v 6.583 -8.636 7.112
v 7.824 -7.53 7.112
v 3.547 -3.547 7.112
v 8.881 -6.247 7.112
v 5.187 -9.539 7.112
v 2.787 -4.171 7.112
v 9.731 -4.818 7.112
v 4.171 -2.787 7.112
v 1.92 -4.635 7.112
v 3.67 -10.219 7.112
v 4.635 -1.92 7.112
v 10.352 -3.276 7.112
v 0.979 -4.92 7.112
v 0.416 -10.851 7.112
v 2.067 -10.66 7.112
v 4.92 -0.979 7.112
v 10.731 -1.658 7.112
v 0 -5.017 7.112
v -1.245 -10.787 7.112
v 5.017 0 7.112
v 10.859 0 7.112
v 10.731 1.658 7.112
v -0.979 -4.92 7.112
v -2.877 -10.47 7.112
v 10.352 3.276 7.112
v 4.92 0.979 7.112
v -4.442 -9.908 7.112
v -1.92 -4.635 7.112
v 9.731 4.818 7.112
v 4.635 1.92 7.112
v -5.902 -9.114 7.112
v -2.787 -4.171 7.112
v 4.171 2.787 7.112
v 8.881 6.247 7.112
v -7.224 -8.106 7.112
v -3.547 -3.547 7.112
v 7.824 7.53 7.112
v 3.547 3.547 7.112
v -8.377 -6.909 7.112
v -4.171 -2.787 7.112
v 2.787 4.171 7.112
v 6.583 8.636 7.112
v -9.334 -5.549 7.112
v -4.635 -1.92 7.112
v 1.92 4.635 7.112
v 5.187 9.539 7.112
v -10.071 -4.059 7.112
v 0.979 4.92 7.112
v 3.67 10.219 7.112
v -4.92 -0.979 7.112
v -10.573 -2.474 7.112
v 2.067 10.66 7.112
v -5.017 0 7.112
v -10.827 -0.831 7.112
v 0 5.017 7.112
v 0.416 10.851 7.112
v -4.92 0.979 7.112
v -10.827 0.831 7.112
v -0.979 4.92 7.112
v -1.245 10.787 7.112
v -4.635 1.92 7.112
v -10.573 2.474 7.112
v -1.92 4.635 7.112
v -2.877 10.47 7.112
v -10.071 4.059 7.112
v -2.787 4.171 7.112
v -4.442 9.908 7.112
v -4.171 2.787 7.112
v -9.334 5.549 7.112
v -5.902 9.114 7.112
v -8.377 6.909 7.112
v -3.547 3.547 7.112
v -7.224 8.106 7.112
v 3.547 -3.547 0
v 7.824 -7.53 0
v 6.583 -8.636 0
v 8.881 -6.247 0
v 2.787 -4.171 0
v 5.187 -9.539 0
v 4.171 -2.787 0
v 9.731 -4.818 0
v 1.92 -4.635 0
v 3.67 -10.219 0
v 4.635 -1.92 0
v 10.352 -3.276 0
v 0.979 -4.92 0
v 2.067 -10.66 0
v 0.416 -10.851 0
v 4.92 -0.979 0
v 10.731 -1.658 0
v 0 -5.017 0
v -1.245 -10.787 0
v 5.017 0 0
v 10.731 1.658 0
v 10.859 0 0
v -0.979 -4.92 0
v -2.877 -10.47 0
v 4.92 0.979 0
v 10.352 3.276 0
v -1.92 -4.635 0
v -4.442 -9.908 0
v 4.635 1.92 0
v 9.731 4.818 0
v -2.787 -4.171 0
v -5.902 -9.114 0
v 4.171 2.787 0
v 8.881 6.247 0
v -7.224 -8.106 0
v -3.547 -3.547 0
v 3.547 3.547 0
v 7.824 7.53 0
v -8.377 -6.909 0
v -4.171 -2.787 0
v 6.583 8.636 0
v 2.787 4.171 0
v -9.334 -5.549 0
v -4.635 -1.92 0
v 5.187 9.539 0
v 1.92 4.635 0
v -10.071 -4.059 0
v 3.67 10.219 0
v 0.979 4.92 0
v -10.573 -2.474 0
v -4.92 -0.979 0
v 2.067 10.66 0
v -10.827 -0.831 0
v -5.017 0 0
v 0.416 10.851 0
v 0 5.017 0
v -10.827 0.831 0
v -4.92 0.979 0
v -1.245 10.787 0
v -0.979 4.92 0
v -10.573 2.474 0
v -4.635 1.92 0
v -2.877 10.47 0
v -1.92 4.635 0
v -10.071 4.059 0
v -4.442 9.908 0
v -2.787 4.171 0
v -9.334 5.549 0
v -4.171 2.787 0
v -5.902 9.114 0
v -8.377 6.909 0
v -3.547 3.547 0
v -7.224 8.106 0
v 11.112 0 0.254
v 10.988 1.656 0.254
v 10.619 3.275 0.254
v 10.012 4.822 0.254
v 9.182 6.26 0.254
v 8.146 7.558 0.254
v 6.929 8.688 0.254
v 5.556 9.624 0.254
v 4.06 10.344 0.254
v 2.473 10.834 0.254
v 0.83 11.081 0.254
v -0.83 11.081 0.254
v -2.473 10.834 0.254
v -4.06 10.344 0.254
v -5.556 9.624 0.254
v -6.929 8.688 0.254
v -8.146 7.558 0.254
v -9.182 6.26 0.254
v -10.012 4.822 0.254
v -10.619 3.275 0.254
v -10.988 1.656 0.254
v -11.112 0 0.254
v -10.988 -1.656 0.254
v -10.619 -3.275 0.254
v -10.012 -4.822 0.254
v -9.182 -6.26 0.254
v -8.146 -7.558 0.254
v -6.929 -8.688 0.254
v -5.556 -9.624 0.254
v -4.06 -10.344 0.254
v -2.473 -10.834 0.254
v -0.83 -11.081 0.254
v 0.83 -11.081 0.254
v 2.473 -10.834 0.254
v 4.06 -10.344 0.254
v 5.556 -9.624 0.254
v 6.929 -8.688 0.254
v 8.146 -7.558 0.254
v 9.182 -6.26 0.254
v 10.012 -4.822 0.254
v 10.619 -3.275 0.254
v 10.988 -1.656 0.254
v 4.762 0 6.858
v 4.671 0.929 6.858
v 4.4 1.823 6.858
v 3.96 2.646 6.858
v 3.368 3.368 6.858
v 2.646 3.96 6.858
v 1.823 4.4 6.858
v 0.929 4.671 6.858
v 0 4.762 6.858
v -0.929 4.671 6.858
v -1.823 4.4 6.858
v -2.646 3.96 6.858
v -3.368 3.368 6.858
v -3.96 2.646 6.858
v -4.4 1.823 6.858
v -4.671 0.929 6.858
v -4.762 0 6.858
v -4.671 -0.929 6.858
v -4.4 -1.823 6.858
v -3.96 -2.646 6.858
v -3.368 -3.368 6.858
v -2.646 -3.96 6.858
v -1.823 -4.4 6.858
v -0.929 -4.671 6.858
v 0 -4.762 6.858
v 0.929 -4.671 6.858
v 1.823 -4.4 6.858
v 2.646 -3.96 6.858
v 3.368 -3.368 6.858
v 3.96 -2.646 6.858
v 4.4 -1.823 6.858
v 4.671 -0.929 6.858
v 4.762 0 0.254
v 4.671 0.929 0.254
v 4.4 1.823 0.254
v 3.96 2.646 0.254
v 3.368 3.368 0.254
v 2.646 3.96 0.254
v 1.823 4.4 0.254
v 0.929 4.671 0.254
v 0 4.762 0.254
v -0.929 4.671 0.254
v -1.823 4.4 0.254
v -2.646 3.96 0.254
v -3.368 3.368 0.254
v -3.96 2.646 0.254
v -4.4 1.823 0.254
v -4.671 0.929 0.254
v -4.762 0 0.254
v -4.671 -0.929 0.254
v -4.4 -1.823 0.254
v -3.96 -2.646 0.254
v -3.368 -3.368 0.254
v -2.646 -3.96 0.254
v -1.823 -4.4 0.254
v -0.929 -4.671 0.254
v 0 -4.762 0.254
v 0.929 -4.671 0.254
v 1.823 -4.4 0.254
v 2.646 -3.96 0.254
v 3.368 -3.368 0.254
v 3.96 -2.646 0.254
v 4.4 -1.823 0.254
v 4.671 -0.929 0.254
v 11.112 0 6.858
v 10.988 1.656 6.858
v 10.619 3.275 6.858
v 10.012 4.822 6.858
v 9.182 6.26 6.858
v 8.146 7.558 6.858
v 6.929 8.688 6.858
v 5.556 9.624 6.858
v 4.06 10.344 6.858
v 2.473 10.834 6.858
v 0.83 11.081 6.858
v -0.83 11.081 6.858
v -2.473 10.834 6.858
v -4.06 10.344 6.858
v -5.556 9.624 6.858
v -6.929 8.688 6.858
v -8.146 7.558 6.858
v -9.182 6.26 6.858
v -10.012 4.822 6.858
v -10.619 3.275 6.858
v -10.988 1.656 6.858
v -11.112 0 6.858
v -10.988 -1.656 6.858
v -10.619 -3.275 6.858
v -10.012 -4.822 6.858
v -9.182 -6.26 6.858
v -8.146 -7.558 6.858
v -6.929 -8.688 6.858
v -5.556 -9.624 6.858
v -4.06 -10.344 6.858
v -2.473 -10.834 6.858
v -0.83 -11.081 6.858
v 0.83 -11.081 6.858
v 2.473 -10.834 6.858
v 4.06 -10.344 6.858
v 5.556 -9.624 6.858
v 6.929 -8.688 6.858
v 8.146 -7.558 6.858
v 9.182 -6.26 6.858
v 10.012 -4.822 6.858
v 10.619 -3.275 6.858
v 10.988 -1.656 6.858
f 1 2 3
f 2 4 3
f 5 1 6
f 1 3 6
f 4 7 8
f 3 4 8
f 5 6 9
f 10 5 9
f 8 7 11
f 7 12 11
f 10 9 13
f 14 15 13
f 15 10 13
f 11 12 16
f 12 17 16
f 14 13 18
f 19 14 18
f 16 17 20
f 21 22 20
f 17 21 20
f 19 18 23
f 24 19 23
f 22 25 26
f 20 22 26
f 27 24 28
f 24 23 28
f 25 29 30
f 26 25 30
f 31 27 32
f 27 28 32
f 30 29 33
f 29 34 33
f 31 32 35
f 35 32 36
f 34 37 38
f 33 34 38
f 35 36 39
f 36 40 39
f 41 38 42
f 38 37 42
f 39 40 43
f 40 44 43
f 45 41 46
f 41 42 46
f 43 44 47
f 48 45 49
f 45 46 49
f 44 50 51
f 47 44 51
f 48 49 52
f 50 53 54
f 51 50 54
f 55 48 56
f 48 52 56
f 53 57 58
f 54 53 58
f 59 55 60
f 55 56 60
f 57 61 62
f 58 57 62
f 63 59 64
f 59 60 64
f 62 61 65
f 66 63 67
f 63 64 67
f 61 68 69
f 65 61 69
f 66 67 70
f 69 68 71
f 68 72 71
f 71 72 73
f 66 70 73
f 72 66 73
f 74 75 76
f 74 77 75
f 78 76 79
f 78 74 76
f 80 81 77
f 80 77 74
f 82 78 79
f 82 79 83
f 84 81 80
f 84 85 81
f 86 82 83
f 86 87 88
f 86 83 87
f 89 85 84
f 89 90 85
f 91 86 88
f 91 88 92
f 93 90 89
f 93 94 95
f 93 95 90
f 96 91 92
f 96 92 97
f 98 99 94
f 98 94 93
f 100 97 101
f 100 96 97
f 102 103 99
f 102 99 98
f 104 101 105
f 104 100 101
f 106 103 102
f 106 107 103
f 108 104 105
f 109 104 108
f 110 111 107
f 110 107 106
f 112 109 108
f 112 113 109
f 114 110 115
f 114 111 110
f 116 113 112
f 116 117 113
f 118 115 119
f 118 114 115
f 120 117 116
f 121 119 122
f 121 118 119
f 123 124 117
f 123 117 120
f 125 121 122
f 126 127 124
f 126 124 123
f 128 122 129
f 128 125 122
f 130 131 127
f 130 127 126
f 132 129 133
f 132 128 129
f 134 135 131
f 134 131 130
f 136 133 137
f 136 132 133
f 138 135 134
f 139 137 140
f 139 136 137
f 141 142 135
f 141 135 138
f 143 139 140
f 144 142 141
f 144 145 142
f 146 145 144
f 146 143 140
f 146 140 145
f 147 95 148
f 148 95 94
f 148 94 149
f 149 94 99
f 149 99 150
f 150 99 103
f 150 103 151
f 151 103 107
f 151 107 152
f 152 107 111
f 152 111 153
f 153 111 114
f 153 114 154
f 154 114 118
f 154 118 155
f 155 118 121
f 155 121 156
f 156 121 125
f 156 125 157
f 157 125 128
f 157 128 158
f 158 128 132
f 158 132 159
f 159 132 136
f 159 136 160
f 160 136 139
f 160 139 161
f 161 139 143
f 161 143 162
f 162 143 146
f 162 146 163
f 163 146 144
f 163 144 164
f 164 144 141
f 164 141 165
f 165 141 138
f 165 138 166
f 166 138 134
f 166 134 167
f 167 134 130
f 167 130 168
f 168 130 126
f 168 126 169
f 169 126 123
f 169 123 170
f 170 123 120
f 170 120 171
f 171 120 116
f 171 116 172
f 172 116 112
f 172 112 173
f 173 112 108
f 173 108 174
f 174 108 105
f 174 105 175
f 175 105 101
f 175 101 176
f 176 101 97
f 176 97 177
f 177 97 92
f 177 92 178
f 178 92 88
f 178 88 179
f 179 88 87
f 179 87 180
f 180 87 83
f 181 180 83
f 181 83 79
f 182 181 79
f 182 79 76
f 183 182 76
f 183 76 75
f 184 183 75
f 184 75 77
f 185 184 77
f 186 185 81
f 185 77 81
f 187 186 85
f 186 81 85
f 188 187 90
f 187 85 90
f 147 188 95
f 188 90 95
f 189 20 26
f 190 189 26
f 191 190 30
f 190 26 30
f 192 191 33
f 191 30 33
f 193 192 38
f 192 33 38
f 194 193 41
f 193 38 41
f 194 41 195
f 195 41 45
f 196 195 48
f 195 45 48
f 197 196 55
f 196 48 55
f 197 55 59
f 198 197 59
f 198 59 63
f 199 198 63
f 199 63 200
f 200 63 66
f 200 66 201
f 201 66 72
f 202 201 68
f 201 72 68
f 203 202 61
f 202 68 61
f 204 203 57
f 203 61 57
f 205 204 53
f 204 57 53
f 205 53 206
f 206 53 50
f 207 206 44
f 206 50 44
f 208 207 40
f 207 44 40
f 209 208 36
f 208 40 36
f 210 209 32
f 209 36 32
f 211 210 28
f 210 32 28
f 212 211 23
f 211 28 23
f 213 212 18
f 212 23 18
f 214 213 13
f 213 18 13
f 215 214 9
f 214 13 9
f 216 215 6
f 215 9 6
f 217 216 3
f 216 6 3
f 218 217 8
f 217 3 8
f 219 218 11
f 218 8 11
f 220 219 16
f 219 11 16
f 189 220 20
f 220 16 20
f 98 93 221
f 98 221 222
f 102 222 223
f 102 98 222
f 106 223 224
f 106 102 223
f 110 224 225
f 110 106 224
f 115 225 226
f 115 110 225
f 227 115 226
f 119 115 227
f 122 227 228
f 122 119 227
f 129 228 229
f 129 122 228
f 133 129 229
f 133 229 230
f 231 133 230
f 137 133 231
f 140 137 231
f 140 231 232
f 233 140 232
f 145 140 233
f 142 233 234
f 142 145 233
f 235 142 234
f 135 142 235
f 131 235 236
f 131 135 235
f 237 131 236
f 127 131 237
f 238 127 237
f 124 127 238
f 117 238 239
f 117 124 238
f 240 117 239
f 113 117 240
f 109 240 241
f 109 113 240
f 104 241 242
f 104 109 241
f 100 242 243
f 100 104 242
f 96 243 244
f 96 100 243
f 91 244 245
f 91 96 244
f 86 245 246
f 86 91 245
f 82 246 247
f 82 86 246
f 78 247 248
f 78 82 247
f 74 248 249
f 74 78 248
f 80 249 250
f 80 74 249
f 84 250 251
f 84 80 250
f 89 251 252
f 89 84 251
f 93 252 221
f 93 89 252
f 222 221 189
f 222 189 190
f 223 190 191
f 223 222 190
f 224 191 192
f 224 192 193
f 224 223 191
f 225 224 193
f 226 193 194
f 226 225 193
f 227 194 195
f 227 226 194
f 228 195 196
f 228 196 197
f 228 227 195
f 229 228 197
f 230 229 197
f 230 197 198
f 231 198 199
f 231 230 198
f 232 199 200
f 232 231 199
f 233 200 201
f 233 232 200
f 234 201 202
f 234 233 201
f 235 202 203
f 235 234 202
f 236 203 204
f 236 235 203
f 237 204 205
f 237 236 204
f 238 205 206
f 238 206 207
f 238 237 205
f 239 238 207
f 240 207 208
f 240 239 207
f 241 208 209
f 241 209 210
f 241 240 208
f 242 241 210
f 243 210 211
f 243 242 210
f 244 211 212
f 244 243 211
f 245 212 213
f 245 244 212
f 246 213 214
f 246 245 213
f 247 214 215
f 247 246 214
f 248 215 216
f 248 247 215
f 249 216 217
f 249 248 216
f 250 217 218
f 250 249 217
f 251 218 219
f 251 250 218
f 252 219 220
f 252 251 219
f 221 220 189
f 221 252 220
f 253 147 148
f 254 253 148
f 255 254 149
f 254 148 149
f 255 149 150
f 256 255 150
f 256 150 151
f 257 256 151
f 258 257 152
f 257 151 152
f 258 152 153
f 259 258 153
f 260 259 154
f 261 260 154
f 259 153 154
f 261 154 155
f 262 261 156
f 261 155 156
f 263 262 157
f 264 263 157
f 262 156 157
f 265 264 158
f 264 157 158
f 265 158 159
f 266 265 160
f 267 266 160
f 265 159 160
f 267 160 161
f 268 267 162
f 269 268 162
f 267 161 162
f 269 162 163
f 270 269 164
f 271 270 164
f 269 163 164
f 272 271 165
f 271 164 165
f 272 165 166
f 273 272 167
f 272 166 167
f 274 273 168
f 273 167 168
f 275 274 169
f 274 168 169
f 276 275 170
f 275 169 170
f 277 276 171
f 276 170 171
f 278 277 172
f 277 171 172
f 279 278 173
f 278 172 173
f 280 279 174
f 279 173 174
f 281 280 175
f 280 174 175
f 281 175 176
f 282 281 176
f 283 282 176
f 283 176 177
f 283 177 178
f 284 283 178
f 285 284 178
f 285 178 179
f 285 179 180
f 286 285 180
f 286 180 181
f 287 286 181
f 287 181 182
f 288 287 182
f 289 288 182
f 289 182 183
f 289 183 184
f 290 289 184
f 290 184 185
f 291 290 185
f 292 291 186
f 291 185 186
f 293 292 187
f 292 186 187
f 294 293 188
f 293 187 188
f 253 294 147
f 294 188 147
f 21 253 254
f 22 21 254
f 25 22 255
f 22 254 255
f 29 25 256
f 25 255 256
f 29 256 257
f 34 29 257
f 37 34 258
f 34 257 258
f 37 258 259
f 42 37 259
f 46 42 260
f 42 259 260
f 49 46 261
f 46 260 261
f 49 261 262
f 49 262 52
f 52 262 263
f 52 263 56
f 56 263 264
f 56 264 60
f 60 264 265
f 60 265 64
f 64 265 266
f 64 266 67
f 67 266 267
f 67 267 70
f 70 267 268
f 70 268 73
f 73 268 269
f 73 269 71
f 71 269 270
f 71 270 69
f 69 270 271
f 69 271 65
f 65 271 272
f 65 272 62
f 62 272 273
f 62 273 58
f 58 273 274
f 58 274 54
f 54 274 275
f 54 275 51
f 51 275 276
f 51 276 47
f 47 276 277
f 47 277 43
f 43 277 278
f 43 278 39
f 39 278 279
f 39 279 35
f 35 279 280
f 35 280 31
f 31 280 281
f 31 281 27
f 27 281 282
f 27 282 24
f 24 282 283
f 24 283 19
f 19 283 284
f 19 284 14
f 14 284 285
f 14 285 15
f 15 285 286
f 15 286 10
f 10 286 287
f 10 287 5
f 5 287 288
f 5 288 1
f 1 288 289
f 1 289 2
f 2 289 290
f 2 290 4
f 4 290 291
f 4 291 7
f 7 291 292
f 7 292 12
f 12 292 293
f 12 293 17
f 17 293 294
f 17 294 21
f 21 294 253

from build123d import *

# Parameters (mm, degrees)
SKETCH1_W     = 6.35
SKETCH1_H     = 7.112
CHAMFER1_SIZE = 0.254


with BuildPart() as part:
    # Sketch1 → Revolve1 (revolve)
    with BuildSketch(Plane(origin=(0, 0, 0), x_dir=(1, 0, 0), z_dir=(0, 1, 0))):
        with Locations((7.9375, -3.556)):
            Rectangle(SKETCH1_W, SKETCH1_H)
    revolve(axis=Axis((0, 0, 0), (0, 0, 1)))

    # Chamfer1
    chamfer1_edges = [part.edges().sort_by_distance(p)[0] for p in [
        (-11.1125, 0, 0),
        (-11.1125, 0, 7.112),
        (-4.7625, 0, 7.112),
        (-4.7625, 0, 0),
    ]]
    chamfer(chamfer1_edges, length=CHAMFER1_SIZE)


solid = part.part
